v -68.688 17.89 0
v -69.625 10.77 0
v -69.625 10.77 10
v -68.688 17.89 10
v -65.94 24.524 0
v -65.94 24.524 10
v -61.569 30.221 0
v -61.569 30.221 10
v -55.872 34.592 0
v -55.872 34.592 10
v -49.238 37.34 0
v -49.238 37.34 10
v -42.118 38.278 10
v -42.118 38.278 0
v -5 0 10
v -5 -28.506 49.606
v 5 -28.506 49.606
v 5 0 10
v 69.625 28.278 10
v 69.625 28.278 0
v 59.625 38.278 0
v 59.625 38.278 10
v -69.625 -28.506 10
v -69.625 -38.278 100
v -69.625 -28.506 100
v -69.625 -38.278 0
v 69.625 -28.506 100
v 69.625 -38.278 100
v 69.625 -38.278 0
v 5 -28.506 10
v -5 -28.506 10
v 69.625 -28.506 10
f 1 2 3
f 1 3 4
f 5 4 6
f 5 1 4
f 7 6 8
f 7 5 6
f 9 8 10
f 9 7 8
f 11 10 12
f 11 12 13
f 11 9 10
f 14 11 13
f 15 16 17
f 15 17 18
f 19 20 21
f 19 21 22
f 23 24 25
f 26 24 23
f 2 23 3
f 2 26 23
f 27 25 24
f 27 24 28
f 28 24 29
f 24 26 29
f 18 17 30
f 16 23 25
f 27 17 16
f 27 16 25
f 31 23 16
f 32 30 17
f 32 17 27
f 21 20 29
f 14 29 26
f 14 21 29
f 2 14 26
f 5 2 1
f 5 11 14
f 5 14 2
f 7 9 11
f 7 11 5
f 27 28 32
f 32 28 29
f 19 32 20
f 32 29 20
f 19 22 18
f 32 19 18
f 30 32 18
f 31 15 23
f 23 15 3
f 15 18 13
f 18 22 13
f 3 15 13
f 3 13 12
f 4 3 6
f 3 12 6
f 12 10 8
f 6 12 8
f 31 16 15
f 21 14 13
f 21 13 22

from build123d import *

# Parameters (mm, degrees)
BOSS_EXTRUDE1_DEPTH = 10
CHAMFER1_SIZE       = 10
SKETCH2_W           = 139.250997166
SKETCH2_H           = 9.771290108
BOSS_EXTRUDE2_DEPTH = 90
RIB1_REACH          = 129.722
SKETCH3_WALL_W      = 306.241984106
SKETCH3_WALL_H      = 10


with BuildPart() as part:
    # Sketch1 → Boss-Extrude1 (new body)
    with BuildSketch(Plane.XY):
        with BuildLine():
            Line((-42.118258456, 38.277525287), (69.625498583, 38.277525287))
            Line((69.625498583, 38.277525287), (69.625498583, -38.277525287))
            Line((69.625498583, -38.277525287), (-69.625498583, -38.277525287))
            Line((-69.625498583, -38.277525287), (-69.625498583, 10.77028516))
            ThreePointArc((-69.625498583, 10.77028516), (-61.568814481, 30.220841186), (-42.118258456, 38.277525287))
        make_face()
    extrude(amount=BOSS_EXTRUDE1_DEPTH)

    # Chamfer1
    chamfer1_edges = [part.edges().sort_by_distance(p)[0] for p in [
        (69.625498583, 38.277525287, 5),
    ]]
    chamfer(chamfer1_edges, length=CHAMFER1_SIZE)

    # Sketch2 → Boss-Extrude2 (add)
    with BuildSketch(Plane.XY.offset(10)):
        with Locations((0, -33.391880233)):
            Rectangle(SKETCH2_W, SKETCH2_H)
    extrude(amount=BOSS_EXTRUDE2_DEPTH)

    # Sketch3 wall → Rib1 (add, up to next)
    with BuildSketch(Plane(origin=(0, -14.25311759, 29.803162332), x_dir=(0, 0.584165456178, -0.811634597469), z_dir=(0, 0.811634597469, 0.584165456178)), mode=Mode.PRIVATE) as rib1_sk1:
        Rectangle(SKETCH3_WALL_W, SKETCH3_WALL_H)
    rib1_tool1 = extrude(rib1_sk1.sketch, amount=-RIB1_REACH, mode=Mode.PRIVATE) - part.part
    add(rib1_tool1.solids().sort_by_distance((0, -14.25311759, 29.803162332))[0])


solid = part.part
